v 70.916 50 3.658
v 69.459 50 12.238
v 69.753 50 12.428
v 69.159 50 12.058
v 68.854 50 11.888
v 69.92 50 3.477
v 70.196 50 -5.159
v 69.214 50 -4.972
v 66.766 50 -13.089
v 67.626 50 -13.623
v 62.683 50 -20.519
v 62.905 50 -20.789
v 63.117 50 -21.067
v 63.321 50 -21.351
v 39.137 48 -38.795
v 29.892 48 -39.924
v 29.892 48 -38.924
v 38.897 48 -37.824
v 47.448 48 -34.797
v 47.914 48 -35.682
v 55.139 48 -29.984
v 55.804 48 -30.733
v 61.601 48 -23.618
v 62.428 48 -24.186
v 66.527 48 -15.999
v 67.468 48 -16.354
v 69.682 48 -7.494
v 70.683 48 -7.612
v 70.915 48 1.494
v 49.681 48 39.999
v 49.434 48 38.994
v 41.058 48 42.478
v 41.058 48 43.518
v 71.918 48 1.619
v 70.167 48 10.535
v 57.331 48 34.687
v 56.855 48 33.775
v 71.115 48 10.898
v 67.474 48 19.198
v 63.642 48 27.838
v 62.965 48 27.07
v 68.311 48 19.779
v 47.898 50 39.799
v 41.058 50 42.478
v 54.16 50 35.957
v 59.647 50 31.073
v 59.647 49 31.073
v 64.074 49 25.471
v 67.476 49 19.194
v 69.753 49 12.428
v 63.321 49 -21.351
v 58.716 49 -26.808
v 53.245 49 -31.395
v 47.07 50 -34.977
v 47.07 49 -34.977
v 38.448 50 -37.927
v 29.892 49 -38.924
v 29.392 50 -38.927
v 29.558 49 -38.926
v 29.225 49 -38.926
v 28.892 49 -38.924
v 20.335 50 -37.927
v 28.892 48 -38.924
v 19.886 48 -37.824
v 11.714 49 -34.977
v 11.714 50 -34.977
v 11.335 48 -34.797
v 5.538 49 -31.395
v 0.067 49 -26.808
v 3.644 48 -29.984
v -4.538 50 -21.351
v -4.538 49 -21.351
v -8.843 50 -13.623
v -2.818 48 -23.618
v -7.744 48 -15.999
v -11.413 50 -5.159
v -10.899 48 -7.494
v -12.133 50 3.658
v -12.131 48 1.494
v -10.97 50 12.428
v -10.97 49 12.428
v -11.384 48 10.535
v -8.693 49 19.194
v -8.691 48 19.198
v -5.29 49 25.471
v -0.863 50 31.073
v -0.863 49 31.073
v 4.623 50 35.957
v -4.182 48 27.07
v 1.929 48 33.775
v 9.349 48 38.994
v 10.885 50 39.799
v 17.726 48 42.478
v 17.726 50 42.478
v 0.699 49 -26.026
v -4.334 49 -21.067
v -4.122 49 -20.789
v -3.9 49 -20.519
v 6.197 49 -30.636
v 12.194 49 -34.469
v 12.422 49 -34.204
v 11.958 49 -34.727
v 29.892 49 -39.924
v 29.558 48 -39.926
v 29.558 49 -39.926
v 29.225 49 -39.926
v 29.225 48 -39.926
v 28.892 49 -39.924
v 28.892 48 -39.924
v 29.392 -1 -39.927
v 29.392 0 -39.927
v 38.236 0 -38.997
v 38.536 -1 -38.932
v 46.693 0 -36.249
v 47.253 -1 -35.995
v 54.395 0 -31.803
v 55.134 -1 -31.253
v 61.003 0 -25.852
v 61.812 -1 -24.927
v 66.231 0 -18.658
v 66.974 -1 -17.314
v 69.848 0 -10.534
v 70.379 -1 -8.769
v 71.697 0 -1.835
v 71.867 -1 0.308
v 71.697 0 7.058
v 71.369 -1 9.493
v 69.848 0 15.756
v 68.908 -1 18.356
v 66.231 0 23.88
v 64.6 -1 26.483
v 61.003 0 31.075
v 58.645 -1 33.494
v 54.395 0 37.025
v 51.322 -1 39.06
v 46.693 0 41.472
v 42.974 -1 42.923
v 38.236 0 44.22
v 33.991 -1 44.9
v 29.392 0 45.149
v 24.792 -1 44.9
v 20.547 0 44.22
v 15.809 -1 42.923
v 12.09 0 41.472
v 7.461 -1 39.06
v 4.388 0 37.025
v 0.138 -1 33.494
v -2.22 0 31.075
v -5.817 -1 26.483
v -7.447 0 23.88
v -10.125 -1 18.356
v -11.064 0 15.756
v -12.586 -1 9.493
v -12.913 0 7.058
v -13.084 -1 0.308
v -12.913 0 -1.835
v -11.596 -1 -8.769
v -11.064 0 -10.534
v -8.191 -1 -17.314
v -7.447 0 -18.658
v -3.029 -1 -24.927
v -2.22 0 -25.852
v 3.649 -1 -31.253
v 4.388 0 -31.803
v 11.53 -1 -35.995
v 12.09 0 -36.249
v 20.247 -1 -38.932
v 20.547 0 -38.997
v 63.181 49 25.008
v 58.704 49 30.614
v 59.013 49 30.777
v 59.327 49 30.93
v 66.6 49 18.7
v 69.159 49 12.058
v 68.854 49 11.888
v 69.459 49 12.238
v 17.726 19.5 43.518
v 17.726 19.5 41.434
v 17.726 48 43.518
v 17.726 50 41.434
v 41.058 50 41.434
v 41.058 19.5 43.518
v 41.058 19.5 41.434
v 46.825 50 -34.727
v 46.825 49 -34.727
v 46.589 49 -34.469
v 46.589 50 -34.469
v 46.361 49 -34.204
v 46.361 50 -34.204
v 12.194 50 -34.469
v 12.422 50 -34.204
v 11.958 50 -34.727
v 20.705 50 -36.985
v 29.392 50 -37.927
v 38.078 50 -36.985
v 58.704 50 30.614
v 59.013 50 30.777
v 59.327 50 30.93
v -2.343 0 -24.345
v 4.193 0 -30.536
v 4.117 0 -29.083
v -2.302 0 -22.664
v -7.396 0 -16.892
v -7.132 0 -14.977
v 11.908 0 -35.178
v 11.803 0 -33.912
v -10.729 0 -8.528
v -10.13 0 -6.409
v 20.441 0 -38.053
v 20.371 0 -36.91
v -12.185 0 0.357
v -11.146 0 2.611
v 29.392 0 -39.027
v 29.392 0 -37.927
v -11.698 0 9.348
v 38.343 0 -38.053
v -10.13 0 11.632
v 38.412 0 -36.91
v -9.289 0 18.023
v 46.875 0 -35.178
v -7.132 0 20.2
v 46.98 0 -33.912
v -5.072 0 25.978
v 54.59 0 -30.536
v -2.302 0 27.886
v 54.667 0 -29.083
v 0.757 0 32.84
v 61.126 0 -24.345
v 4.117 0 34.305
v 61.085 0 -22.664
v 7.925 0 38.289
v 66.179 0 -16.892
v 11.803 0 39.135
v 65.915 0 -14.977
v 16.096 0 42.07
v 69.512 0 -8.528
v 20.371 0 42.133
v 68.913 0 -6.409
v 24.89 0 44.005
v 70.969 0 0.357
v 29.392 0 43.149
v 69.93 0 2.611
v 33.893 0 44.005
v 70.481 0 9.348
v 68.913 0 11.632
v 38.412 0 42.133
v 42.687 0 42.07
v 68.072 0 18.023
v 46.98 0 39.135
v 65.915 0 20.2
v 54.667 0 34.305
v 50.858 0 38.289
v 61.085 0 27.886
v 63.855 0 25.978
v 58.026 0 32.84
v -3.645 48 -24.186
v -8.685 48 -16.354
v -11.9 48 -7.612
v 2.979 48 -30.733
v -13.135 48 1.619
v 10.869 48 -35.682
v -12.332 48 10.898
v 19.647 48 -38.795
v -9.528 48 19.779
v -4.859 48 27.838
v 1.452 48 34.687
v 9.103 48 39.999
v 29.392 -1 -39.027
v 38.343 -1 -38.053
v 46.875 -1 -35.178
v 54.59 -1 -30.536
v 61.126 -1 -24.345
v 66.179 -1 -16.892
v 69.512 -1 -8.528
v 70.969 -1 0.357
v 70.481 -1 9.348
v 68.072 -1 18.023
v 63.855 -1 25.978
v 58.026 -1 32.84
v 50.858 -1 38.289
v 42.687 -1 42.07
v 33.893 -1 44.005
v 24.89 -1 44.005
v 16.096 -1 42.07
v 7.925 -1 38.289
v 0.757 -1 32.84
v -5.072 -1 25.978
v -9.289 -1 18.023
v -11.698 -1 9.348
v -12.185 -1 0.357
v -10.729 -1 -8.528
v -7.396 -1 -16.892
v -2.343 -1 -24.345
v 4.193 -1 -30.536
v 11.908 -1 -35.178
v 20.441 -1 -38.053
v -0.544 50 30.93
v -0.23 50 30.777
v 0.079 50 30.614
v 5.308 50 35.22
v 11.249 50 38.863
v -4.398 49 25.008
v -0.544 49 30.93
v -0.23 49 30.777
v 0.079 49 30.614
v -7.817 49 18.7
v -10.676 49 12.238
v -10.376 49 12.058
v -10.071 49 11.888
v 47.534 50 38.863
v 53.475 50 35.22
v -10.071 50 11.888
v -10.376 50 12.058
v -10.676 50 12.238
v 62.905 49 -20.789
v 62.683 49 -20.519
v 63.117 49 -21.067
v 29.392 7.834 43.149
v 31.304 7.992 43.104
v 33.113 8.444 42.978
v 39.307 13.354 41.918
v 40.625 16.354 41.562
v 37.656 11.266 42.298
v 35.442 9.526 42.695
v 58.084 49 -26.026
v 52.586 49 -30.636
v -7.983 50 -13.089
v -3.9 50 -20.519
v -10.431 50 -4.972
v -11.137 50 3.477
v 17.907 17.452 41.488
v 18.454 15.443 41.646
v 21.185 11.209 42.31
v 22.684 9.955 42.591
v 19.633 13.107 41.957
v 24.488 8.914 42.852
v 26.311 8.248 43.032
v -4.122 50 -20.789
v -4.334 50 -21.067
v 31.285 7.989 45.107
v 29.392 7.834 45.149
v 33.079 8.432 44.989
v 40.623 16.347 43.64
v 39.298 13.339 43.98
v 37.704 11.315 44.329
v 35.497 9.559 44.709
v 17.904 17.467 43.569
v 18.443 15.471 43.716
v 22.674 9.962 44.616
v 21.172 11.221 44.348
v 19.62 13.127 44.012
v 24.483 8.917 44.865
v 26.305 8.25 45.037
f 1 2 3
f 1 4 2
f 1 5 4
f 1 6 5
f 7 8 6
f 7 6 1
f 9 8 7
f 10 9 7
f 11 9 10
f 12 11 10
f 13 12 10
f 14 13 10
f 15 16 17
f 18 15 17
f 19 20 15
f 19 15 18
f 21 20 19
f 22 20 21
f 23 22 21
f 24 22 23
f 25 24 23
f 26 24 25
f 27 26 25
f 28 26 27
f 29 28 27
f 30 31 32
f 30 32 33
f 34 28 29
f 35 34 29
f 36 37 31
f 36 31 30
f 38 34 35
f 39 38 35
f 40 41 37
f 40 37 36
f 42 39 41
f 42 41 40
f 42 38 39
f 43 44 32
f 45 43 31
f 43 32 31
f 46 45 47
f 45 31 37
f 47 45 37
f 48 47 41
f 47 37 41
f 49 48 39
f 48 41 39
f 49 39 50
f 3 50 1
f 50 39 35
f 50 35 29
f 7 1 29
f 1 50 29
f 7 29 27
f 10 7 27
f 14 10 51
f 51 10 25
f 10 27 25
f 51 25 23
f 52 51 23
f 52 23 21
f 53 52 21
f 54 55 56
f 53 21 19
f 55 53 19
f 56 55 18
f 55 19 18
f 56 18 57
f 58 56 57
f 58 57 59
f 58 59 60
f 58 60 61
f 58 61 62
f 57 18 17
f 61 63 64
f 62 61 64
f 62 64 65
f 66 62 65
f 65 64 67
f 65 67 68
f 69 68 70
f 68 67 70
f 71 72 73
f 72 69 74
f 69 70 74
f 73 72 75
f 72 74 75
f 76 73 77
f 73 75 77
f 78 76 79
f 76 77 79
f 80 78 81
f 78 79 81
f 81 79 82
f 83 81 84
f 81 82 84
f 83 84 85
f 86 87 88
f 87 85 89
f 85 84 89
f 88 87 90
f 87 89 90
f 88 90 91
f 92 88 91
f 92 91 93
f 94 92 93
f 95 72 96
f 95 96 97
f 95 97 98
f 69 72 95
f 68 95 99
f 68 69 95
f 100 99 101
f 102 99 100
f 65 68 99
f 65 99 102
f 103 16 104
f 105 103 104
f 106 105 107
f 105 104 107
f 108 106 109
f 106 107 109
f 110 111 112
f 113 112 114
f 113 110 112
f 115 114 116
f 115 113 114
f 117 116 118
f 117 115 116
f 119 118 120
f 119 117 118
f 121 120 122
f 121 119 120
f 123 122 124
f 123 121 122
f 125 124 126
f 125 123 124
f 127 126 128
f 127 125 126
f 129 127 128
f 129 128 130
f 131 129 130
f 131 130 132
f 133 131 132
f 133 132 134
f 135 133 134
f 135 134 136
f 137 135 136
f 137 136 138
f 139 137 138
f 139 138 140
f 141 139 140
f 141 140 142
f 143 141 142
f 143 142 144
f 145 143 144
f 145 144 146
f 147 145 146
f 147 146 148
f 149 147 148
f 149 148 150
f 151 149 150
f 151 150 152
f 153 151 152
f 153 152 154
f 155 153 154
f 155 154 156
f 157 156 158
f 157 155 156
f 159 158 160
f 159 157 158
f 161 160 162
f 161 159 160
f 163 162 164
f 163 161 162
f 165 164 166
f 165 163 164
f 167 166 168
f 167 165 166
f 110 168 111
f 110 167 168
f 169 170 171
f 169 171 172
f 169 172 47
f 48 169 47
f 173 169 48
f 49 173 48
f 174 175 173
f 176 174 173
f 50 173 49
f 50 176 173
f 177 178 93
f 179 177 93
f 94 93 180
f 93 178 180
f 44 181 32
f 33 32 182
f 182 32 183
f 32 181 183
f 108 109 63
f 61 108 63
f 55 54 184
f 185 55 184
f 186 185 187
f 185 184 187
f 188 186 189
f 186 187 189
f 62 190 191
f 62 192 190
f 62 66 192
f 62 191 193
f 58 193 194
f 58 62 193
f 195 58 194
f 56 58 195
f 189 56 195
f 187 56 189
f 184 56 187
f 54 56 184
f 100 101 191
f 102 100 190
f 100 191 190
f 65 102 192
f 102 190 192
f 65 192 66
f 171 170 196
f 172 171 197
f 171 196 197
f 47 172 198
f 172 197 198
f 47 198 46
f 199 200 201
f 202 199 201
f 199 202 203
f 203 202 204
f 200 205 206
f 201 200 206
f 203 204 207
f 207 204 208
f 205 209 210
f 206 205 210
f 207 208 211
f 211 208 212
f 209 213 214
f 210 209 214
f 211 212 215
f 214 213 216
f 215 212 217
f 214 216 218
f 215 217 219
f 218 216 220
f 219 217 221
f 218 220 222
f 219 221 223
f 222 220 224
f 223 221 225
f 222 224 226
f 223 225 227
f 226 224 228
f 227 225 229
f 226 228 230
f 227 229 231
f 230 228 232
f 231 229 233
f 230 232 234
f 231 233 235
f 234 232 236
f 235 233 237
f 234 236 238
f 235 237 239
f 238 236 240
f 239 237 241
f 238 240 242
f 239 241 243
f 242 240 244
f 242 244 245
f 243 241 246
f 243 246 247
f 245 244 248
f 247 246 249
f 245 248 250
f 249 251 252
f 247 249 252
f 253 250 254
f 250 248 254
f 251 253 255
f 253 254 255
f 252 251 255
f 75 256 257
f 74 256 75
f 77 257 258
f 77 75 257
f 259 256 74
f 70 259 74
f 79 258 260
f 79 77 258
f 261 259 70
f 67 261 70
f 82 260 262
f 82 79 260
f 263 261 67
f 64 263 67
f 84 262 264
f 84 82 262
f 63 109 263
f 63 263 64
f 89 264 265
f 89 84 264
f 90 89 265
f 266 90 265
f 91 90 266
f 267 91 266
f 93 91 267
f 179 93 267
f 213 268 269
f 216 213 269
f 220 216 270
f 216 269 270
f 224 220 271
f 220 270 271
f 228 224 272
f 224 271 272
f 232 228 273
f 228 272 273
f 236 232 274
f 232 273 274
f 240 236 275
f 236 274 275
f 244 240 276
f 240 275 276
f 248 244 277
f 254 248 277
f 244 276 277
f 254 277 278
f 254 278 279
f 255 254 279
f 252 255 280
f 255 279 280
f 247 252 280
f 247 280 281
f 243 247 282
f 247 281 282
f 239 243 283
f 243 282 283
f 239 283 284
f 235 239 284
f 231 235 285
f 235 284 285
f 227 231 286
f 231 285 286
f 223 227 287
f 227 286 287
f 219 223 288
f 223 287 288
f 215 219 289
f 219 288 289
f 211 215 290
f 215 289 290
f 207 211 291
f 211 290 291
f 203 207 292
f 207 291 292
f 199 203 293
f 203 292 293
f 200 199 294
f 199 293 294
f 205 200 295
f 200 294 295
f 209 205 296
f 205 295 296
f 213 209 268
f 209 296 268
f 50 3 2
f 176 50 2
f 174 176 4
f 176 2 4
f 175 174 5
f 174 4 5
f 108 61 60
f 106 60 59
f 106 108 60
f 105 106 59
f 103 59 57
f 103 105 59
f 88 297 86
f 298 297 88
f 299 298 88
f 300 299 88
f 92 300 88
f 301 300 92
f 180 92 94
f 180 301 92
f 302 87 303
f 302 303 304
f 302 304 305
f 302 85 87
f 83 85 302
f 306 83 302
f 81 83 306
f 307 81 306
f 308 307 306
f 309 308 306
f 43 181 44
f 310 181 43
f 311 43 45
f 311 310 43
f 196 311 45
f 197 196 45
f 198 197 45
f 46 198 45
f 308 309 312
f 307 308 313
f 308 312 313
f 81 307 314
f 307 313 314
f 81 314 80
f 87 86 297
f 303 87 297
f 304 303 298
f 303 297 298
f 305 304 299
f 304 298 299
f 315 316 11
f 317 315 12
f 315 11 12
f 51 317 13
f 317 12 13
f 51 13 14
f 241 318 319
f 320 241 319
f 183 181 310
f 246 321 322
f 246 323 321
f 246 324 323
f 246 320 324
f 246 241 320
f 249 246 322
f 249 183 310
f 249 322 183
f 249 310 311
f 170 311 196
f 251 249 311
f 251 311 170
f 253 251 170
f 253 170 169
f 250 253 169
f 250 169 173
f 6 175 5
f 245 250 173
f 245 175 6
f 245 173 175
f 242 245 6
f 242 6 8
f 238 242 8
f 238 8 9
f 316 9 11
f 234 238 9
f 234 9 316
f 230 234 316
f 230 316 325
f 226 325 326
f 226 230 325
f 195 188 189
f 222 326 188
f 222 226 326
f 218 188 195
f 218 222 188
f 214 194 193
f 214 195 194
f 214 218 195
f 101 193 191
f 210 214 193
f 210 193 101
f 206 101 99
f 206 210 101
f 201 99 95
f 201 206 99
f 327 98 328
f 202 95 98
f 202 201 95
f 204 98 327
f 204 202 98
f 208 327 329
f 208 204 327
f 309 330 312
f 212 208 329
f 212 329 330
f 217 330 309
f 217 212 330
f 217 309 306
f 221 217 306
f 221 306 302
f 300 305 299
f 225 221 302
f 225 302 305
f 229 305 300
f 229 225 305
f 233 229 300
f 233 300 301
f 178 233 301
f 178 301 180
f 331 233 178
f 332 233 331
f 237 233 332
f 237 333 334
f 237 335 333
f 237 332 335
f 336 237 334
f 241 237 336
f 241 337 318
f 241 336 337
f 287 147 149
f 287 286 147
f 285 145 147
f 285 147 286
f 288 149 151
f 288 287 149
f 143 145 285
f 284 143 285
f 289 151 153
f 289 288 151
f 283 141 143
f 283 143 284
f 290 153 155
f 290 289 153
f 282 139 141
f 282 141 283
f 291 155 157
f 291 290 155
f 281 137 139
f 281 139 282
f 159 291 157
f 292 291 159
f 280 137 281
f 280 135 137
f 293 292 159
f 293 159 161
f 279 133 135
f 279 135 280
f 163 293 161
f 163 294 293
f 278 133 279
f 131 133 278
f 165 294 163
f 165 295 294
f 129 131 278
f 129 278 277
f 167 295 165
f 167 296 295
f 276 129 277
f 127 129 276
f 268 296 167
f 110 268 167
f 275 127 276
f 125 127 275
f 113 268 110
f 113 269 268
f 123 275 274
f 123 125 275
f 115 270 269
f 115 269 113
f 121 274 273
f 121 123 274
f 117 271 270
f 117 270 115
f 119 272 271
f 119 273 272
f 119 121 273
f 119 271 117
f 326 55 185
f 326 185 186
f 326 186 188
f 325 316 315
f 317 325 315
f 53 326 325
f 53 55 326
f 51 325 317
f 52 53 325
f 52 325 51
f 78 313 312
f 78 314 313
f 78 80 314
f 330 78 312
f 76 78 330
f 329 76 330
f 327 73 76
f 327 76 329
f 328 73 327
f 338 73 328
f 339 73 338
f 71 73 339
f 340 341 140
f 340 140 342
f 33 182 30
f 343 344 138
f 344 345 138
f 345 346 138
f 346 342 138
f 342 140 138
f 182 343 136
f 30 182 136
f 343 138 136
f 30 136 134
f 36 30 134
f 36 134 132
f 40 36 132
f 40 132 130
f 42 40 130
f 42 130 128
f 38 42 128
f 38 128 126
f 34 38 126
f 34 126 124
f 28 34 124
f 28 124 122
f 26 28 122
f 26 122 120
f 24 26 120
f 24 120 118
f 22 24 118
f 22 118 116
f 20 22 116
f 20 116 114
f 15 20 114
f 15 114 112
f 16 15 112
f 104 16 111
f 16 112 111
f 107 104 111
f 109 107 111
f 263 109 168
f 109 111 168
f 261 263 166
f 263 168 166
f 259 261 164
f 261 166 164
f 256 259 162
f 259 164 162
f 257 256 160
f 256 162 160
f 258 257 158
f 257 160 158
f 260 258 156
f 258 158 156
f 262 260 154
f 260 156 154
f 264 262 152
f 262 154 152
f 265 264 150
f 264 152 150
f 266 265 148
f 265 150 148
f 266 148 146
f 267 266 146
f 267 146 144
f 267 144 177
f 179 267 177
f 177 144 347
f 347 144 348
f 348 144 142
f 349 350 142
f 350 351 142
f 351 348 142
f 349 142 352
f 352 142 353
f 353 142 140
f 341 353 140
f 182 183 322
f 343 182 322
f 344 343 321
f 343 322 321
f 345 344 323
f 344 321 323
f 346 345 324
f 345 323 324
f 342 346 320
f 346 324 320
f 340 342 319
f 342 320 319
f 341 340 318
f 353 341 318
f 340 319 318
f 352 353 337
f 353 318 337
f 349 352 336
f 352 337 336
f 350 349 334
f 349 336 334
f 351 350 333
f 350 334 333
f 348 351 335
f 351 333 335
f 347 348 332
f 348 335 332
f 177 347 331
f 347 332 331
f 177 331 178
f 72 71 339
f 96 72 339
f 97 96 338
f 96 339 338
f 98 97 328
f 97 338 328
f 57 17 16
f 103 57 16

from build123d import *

# Parameters (mm, degrees)
SKETCH2_R           = 42.538
SKETCH2_R_2         = 40.538
BOSS_EXTRUDE1_DEPTH = 51
CUT_EXTRUDE1_DEPTH  = 48
CUT_EXTRUDE3_START  = -1
CUT_EXTRUDE3_DEPTH  = 1
SKETCH29_R          = 10.65
CUT_EXTRUDE16_DEPTH = 1
CUT_EXTRUDE17_START = -2
SKETCH30_R          = 42.538
SKETCH30_R_2        = 41.538
CUT_EXTRUDE17_DEPTH = 2
BOSS_EXTRUDE3_DEPTH = 1
BOSS_EXTRUDE4_START = 1
SKETCH33_R          = 42.538
SKETCH33_R_2        = 41.638
BOSS_EXTRUDE4_DEPTH = 1


# Read off the part's stored shape, not the designer's step: Cut-Extrude3
with BuildPart() as part:
    # Sketch2 → Boss-Extrude1 (new body)
    with BuildSketch(Plane(origin=(0, 0, 0), x_dir=(-1, 0, 0), z_dir=(0, 1, 0))):
        with Locations(Location((-29.391570254, 2.611368154, 0), (0, 0, 90))):
            Circle(SKETCH2_R)
        with Locations(Location((-29.391570254, 2.611368154, 0), (0, 0, 90))):
            Circle(SKETCH2_R_2, mode=Mode.SUBTRACT)
    extrude(amount=BOSS_EXTRUDE1_DEPTH)

    # Sketch3 → Cut-Extrude1 (cut)
    with BuildSketch(Plane.XY):
        with BuildLine():
            Line((17.725570254, 19.5), (17.725570254, 51))
            Line((17.725570254, 51), (41.057570254, 51))
            Line((41.057570254, 51), (41.057570254, 19.5))
            ThreePointArc((41.057570254, 19.5), (29.391570254, 7.834), (17.725570254, 19.5))
        make_face()
    extrude(amount=CUT_EXTRUDE1_DEPTH, mode=Mode.SUBTRACT)

    # Cut-Extrude3 outline → Cut-Extrude3 (cut)
    with BuildSketch(Plane(origin=(0, 51, 0), x_dir=(1, 0, 0), z_dir=(0, 1, 0)).offset(CUT_EXTRUDE3_START)):
        with BuildLine():
            ThreePointArc((41.057570254, -43.518407744), (29.391570254, 39.926631846), (17.725570254, -43.518407744))
            Line((17.725570254, -43.518407744), (17.725570254, -41.434478385))
            ThreePointArc((17.725570254, -41.434478385), (29.391570254, 37.926631846), (41.057570254, -41.434478385))
            Line((41.057570254, -41.434478385), (41.057570254, -43.518407744))
        make_face()
    extrude(amount=CUT_EXTRUDE3_DEPTH, mode=Mode.SUBTRACT)

    # Sketch29 → Cut-Extrude16 (cut)
    with BuildSketch(Plane(origin=(58.783140508, 50, 5.222736308), x_dir=(1, 0, 0), z_dir=(0, 1, 0))):
        with Locations((-54.559325107, 32.628524909)):
            Circle(SKETCH29_R)
        with Locations((-4.223815401, 32.628524909)):
            Circle(SKETCH29_R)
        with Locations((5.046553517, -16.055747722)):
            Circle(SKETCH29_R)
        with Locations((-63.829694025, -16.055747722)):
            Circle(SKETCH29_R)
    extrude(amount=-CUT_EXTRUDE16_DEPTH, mode=Mode.SUBTRACT)

    # Sketch30 → Cut-Extrude17 (cut)
    with BuildSketch(Plane(origin=(0, 50, 0), x_dir=(1, 0, 0), z_dir=(0, 1, 0)).offset(CUT_EXTRUDE17_START)):
        with Locations(Location((29.391570254, -2.611368154, 0), (0, 0, 285.917258926))):
            Circle(SKETCH30_R)
        with Locations((29.391570254, -2.611368154)):
            Circle(SKETCH30_R_2, mode=Mode.SUBTRACT)
    extrude(amount=CUT_EXTRUDE17_DEPTH, mode=Mode.SUBTRACT)

    # Sketch32 → Boss-Extrude3 (add)
    with BuildSketch(Plane(origin=(0, 48, 0), x_dir=(1, 0, 0), z_dir=(0, 1, 0))):
        with BuildLine():
            Line((29.891570254, 38.923622444), (29.891570254, 39.923693196))
            ThreePointArc((29.891570254, 39.923693196), (29.391570254, 39.926631846), (28.891570254, 39.923693196))
            Line((28.891570254, 39.923693196), (28.891570254, 38.923622444))
            ThreePointArc((28.891570254, 38.923622444), (29.391570254, 38.926631846), (29.891570254, 38.923622444))
        make_face()
    extrude(amount=BOSS_EXTRUDE3_DEPTH)

    # Sketch33 → Boss-Extrude4 (add)
    with BuildSketch(Plane.XZ.offset(BOSS_EXTRUDE4_START)):
        with Locations(Location((29.391570254, 2.611368154, 0), (0, 0, 270))):
            Circle(SKETCH33_R)
        with Locations(Location((29.391570254, 2.611368154, 0), (0, 0, 270))):
            Circle(SKETCH33_R_2, mode=Mode.SUBTRACT)
    extrude(amount=-BOSS_EXTRUDE4_DEPTH)


solid = part.part
